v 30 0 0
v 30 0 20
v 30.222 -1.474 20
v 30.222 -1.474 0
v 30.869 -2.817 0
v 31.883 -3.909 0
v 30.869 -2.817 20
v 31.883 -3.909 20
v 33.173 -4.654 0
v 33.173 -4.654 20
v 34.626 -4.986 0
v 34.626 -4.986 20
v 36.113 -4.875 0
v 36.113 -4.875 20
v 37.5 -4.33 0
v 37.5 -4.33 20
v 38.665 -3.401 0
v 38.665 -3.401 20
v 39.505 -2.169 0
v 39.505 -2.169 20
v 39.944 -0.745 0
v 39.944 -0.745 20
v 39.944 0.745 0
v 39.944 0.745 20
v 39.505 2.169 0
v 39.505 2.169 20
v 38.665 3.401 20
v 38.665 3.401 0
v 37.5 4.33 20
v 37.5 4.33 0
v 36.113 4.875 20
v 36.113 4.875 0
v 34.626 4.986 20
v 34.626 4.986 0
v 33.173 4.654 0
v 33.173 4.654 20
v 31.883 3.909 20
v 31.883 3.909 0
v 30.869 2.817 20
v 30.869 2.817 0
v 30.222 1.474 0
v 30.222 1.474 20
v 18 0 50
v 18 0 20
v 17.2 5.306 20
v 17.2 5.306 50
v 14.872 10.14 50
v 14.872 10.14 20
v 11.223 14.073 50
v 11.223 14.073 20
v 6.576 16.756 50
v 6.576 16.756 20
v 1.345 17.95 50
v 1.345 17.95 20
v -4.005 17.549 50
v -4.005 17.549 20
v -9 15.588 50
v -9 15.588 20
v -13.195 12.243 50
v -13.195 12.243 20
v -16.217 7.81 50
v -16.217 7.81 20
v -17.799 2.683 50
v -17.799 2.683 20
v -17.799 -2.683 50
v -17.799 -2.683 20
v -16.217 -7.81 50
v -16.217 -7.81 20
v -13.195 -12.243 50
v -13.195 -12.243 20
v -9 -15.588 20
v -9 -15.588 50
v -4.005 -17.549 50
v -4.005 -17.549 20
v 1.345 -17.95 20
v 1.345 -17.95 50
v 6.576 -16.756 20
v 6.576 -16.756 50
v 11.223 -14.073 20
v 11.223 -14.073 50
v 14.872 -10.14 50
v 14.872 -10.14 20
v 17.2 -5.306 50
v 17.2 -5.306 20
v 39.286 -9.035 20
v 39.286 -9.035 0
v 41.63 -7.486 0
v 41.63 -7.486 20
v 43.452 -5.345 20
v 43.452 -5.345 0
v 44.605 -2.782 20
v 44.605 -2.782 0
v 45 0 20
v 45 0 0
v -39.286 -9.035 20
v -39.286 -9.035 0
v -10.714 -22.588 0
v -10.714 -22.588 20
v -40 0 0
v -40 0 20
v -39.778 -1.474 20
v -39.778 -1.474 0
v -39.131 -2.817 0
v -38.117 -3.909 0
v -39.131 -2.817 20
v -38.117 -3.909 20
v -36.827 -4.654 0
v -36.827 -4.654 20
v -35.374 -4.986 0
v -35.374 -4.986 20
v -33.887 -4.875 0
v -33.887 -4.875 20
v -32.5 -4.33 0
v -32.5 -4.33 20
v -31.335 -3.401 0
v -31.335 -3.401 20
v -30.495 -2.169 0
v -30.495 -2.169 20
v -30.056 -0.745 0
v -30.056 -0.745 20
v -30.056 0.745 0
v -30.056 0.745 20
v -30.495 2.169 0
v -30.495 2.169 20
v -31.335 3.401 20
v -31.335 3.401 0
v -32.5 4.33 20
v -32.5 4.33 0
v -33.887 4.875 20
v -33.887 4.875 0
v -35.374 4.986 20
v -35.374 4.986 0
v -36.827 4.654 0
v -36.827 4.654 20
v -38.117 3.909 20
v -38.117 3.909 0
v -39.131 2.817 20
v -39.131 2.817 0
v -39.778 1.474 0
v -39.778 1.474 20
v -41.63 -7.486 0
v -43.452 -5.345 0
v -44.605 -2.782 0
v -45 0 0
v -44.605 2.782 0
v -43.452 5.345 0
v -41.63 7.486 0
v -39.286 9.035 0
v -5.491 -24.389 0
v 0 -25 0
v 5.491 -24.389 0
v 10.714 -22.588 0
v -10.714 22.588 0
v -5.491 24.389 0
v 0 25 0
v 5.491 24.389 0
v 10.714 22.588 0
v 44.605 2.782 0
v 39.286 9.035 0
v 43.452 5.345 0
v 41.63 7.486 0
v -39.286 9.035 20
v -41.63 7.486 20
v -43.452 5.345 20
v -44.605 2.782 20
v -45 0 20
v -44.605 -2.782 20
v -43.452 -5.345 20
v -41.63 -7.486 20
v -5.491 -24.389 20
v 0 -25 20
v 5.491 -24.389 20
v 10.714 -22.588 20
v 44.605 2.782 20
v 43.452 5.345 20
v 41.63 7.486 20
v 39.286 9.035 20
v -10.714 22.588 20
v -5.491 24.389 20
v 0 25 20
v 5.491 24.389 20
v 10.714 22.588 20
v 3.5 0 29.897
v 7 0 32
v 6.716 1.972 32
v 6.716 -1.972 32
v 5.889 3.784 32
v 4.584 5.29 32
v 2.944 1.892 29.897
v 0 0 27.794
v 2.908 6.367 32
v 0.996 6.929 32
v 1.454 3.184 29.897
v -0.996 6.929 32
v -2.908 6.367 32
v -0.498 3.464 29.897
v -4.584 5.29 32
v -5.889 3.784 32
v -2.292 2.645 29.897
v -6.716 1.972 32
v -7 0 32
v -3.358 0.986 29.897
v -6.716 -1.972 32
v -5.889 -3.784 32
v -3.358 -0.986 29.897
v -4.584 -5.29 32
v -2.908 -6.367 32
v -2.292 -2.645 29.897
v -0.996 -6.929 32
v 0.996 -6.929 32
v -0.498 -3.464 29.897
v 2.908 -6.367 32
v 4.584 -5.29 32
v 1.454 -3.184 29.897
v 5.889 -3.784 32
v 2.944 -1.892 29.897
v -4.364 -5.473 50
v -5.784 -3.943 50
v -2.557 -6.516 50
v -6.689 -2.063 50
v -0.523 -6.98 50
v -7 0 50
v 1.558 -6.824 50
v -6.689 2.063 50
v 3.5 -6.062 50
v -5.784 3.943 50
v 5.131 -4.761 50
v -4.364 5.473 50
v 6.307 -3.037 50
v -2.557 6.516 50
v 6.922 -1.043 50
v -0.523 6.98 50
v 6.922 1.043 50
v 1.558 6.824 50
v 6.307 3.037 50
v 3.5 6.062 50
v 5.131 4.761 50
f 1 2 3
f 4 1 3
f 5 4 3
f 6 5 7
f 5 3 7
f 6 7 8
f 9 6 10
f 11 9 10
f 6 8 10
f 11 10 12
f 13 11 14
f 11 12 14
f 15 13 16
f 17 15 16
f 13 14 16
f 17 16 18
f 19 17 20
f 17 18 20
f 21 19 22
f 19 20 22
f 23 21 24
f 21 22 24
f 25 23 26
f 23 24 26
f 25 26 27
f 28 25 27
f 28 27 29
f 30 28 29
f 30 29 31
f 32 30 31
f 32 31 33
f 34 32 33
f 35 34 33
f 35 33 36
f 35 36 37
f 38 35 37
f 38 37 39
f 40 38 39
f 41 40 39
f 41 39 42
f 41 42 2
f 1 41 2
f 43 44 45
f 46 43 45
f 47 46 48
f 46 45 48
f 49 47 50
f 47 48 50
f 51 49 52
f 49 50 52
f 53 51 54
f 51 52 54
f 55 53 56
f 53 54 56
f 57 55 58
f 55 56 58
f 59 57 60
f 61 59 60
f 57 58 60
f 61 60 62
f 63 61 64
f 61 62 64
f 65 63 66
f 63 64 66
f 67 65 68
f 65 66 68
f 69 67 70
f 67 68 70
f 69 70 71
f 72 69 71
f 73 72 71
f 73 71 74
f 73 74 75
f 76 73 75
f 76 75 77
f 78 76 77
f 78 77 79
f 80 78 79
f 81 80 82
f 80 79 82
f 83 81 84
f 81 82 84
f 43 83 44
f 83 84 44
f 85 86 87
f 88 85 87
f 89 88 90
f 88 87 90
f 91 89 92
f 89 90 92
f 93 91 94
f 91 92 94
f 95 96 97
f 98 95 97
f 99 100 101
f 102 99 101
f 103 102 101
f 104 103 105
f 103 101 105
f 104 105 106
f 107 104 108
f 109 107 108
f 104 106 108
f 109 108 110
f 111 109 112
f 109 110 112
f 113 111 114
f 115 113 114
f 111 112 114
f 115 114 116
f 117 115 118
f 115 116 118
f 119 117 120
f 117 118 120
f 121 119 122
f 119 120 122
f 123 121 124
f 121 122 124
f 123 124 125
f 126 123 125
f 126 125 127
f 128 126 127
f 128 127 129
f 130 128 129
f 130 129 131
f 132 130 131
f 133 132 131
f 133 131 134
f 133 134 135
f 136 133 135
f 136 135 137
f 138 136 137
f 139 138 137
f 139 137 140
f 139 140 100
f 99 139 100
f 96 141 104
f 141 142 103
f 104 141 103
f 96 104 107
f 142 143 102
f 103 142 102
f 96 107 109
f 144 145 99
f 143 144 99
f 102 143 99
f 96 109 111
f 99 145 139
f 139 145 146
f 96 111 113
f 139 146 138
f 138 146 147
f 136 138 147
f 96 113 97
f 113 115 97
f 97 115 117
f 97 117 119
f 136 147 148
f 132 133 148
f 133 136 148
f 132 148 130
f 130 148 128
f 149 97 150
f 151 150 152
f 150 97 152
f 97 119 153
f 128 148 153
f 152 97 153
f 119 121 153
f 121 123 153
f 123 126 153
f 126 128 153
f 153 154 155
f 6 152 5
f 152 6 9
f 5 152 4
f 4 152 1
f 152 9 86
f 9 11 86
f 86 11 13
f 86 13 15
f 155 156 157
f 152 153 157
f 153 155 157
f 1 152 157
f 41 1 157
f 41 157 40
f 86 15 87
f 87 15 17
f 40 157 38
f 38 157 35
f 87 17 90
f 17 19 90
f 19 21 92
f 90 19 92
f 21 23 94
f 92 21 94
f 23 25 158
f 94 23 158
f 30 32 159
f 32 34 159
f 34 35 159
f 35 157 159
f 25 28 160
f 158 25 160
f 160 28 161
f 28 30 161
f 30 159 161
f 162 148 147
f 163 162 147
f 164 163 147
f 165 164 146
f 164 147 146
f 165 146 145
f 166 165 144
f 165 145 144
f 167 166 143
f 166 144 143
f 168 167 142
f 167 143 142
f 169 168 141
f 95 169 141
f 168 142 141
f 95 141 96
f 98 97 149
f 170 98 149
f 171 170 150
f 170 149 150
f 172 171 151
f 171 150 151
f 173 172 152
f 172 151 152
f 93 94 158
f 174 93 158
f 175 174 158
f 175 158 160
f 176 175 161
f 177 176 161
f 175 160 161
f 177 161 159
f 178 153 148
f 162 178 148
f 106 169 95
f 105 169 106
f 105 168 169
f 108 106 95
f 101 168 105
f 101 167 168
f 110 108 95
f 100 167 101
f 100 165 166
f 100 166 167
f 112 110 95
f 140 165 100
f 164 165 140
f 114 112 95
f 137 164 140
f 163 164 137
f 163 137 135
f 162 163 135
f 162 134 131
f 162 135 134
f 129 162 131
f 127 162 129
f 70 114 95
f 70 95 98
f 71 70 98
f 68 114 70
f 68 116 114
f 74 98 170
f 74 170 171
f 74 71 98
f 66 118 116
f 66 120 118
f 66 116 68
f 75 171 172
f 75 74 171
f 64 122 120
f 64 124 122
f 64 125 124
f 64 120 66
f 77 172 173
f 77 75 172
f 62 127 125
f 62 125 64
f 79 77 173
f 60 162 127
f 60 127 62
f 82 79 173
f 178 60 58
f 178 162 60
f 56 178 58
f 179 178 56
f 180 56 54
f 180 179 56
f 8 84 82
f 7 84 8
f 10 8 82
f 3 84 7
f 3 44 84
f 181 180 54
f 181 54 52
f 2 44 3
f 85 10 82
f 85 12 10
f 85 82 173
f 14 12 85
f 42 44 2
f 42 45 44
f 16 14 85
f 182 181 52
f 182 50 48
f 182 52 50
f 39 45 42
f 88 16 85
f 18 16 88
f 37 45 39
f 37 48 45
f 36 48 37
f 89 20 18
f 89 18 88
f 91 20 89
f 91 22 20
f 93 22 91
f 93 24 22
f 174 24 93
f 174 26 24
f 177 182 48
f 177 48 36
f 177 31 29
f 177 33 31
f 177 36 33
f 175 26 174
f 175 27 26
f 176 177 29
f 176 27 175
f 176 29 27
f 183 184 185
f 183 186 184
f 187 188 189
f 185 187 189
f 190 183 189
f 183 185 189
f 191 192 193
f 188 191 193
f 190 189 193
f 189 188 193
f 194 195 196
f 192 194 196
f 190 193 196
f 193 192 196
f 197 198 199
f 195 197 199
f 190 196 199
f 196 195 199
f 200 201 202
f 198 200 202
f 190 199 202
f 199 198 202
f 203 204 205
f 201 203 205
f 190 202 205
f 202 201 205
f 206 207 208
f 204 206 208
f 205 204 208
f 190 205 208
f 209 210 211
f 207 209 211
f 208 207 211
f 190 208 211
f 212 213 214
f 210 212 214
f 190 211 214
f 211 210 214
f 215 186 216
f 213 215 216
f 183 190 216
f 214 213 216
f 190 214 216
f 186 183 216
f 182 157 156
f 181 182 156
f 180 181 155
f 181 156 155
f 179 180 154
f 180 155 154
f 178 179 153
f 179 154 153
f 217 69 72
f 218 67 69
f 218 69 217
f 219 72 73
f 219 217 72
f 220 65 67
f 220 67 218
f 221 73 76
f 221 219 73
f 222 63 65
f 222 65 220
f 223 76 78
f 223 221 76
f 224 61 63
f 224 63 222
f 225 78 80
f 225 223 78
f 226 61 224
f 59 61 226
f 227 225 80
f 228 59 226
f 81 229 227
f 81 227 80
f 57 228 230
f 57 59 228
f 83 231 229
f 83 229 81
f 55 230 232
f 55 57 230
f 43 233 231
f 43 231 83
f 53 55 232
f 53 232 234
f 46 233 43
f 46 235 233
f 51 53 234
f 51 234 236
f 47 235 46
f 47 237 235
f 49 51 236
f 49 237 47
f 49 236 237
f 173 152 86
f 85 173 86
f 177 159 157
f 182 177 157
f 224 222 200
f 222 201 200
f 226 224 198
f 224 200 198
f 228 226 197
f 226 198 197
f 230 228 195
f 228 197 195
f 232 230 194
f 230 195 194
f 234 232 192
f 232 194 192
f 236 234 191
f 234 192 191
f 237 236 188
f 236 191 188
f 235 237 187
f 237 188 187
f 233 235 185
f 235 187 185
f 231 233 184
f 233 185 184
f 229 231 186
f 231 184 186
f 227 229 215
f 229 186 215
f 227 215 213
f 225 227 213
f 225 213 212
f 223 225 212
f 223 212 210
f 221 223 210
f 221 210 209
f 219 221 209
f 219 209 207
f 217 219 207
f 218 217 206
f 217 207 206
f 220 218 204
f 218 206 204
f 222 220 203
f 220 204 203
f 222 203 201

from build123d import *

# Parameters (mm, degrees)
F1_DEPTH = 20
F3_D     = 10
F4_R     = 18
F5_DEPTH = 30
F7_D     = 14
F7_DEPTH = 18
F7_TIP   = 4.2060243332


with BuildPart() as f1:
    # F0 (on Top) → F1 (new body)
    with BuildSketch(Plane.XY):
        with BuildLine():
            ThreePointArc((39.2857142857, -9.0350790291), (29.6547751618, -8.4515425473), (25, 0))
            ThreePointArc((25, 0), (21.1288563682, -13.3630620956), (10.7142857143, -22.5876975726))
            Line((10.7142857143, -22.5876975726), (39.2857142857, -9.0350790291))
        make_face()
        with BuildLine():
            ThreePointArc((10.7142857143, 22.5876975726), (21.1288563682, 13.3630620956), (25, 0))
            ThreePointArc((25, 0), (29.6547751618, 8.4515425473), (39.2857142857, 9.0350790291))
            Line((39.2857142857, 9.0350790291), (10.7142857143, 22.5876975726))
        make_face()
        with BuildLine():
            ThreePointArc((-25, 0), (-21.1288563682, 13.3630620956), (-10.7142857143, 22.5876975726))
            Line((-10.7142857143, 22.5876975726), (-39.2857142857, 9.0350790291))
            ThreePointArc((-39.2857142857, 9.0350790291), (-29.6547751618, 8.4515425473), (-25, 0))
        make_face()
        with BuildLine():
            Line((-39.2857142857, -9.0350790291), (-10.7142857143, -22.5876975726))
            ThreePointArc((-10.7142857143, -22.5876975726), (-21.1288563682, -13.3630620956), (-25, 0))
            ThreePointArc((-25, 0), (-29.6547751618, -8.4515425473), (-39.2857142857, -9.0350790291))
        make_face()
        with BuildLine():
            ThreePointArc((-39.2857142857, -9.0350790291), (-29.6547751618, -8.4515425473), (-25, 0))
            ThreePointArc((-25, 0), (-29.6547751618, 8.4515425473), (-39.2857142857, 9.0350790291))
            ThreePointArc((-39.2857142857, 9.0350790291), (-45, 0), (-39.2857142857, -9.0350790291))
        make_face()
        with BuildLine():
            ThreePointArc((39.2857142857, 9.0350790291), (29.6547751618, 8.4515425473), (25, 0))
            ThreePointArc((25, 0), (29.6547751618, -8.4515425473), (39.2857142857, -9.0350790291))
            ThreePointArc((39.2857142857, -9.0350790291), (43.4515425473, -5.3452248382), (45, 0))
            ThreePointArc((45, 0), (43.4515425473, 5.3452248382), (39.2857142857, 9.0350790291))
        make_face()
        with BuildLine():
            ThreePointArc((10.7142857143, -22.5876975726), (21.1288563682, -13.3630620956), (25, 0))
            ThreePointArc((25, 0), (21.1288563682, 13.3630620956), (10.7142857143, 22.5876975726))
            ThreePointArc((10.7142857143, 22.5876975726), (0, 25), (-10.7142857143, 22.5876975726))
            ThreePointArc((-10.7142857143, 22.5876975726), (-21.1288563682, 13.3630620956), (-25, 0))
            ThreePointArc((-25, 0), (-21.1288563682, -13.3630620956), (-10.7142857143, -22.5876975726))
            ThreePointArc((-10.7142857143, -22.5876975726), (0, -25), (10.7142857143, -22.5876975726))
        make_face()
    extrude(amount=F1_DEPTH)

    # F3 (through all)
    with Locations(Plane(origin=(0, 0, 0), x_dir=(1, 0, 0), z_dir=(0, 0, -1))):
        with Locations((-35, 0), (35, 0)):
            Hole(F3_D / 2)

    # F4 (on face) → F5 (join)
    with BuildSketch(Plane.XY.offset(20)):
        Circle(F4_R)
    extrude(amount=F5_DEPTH)

    # F7
    with Locations(Plane.XY.offset(50)):
        with Locations((0, 0)):
            Hole(F7_D / 2, depth=F7_DEPTH)
            with Locations((0, 0, -(F7_DEPTH + F7_TIP / 2))):  # 118° drill point
                Cone(0, F7_D / 2, F7_TIP, mode=Mode.SUBTRACT)


solid = f1.part
